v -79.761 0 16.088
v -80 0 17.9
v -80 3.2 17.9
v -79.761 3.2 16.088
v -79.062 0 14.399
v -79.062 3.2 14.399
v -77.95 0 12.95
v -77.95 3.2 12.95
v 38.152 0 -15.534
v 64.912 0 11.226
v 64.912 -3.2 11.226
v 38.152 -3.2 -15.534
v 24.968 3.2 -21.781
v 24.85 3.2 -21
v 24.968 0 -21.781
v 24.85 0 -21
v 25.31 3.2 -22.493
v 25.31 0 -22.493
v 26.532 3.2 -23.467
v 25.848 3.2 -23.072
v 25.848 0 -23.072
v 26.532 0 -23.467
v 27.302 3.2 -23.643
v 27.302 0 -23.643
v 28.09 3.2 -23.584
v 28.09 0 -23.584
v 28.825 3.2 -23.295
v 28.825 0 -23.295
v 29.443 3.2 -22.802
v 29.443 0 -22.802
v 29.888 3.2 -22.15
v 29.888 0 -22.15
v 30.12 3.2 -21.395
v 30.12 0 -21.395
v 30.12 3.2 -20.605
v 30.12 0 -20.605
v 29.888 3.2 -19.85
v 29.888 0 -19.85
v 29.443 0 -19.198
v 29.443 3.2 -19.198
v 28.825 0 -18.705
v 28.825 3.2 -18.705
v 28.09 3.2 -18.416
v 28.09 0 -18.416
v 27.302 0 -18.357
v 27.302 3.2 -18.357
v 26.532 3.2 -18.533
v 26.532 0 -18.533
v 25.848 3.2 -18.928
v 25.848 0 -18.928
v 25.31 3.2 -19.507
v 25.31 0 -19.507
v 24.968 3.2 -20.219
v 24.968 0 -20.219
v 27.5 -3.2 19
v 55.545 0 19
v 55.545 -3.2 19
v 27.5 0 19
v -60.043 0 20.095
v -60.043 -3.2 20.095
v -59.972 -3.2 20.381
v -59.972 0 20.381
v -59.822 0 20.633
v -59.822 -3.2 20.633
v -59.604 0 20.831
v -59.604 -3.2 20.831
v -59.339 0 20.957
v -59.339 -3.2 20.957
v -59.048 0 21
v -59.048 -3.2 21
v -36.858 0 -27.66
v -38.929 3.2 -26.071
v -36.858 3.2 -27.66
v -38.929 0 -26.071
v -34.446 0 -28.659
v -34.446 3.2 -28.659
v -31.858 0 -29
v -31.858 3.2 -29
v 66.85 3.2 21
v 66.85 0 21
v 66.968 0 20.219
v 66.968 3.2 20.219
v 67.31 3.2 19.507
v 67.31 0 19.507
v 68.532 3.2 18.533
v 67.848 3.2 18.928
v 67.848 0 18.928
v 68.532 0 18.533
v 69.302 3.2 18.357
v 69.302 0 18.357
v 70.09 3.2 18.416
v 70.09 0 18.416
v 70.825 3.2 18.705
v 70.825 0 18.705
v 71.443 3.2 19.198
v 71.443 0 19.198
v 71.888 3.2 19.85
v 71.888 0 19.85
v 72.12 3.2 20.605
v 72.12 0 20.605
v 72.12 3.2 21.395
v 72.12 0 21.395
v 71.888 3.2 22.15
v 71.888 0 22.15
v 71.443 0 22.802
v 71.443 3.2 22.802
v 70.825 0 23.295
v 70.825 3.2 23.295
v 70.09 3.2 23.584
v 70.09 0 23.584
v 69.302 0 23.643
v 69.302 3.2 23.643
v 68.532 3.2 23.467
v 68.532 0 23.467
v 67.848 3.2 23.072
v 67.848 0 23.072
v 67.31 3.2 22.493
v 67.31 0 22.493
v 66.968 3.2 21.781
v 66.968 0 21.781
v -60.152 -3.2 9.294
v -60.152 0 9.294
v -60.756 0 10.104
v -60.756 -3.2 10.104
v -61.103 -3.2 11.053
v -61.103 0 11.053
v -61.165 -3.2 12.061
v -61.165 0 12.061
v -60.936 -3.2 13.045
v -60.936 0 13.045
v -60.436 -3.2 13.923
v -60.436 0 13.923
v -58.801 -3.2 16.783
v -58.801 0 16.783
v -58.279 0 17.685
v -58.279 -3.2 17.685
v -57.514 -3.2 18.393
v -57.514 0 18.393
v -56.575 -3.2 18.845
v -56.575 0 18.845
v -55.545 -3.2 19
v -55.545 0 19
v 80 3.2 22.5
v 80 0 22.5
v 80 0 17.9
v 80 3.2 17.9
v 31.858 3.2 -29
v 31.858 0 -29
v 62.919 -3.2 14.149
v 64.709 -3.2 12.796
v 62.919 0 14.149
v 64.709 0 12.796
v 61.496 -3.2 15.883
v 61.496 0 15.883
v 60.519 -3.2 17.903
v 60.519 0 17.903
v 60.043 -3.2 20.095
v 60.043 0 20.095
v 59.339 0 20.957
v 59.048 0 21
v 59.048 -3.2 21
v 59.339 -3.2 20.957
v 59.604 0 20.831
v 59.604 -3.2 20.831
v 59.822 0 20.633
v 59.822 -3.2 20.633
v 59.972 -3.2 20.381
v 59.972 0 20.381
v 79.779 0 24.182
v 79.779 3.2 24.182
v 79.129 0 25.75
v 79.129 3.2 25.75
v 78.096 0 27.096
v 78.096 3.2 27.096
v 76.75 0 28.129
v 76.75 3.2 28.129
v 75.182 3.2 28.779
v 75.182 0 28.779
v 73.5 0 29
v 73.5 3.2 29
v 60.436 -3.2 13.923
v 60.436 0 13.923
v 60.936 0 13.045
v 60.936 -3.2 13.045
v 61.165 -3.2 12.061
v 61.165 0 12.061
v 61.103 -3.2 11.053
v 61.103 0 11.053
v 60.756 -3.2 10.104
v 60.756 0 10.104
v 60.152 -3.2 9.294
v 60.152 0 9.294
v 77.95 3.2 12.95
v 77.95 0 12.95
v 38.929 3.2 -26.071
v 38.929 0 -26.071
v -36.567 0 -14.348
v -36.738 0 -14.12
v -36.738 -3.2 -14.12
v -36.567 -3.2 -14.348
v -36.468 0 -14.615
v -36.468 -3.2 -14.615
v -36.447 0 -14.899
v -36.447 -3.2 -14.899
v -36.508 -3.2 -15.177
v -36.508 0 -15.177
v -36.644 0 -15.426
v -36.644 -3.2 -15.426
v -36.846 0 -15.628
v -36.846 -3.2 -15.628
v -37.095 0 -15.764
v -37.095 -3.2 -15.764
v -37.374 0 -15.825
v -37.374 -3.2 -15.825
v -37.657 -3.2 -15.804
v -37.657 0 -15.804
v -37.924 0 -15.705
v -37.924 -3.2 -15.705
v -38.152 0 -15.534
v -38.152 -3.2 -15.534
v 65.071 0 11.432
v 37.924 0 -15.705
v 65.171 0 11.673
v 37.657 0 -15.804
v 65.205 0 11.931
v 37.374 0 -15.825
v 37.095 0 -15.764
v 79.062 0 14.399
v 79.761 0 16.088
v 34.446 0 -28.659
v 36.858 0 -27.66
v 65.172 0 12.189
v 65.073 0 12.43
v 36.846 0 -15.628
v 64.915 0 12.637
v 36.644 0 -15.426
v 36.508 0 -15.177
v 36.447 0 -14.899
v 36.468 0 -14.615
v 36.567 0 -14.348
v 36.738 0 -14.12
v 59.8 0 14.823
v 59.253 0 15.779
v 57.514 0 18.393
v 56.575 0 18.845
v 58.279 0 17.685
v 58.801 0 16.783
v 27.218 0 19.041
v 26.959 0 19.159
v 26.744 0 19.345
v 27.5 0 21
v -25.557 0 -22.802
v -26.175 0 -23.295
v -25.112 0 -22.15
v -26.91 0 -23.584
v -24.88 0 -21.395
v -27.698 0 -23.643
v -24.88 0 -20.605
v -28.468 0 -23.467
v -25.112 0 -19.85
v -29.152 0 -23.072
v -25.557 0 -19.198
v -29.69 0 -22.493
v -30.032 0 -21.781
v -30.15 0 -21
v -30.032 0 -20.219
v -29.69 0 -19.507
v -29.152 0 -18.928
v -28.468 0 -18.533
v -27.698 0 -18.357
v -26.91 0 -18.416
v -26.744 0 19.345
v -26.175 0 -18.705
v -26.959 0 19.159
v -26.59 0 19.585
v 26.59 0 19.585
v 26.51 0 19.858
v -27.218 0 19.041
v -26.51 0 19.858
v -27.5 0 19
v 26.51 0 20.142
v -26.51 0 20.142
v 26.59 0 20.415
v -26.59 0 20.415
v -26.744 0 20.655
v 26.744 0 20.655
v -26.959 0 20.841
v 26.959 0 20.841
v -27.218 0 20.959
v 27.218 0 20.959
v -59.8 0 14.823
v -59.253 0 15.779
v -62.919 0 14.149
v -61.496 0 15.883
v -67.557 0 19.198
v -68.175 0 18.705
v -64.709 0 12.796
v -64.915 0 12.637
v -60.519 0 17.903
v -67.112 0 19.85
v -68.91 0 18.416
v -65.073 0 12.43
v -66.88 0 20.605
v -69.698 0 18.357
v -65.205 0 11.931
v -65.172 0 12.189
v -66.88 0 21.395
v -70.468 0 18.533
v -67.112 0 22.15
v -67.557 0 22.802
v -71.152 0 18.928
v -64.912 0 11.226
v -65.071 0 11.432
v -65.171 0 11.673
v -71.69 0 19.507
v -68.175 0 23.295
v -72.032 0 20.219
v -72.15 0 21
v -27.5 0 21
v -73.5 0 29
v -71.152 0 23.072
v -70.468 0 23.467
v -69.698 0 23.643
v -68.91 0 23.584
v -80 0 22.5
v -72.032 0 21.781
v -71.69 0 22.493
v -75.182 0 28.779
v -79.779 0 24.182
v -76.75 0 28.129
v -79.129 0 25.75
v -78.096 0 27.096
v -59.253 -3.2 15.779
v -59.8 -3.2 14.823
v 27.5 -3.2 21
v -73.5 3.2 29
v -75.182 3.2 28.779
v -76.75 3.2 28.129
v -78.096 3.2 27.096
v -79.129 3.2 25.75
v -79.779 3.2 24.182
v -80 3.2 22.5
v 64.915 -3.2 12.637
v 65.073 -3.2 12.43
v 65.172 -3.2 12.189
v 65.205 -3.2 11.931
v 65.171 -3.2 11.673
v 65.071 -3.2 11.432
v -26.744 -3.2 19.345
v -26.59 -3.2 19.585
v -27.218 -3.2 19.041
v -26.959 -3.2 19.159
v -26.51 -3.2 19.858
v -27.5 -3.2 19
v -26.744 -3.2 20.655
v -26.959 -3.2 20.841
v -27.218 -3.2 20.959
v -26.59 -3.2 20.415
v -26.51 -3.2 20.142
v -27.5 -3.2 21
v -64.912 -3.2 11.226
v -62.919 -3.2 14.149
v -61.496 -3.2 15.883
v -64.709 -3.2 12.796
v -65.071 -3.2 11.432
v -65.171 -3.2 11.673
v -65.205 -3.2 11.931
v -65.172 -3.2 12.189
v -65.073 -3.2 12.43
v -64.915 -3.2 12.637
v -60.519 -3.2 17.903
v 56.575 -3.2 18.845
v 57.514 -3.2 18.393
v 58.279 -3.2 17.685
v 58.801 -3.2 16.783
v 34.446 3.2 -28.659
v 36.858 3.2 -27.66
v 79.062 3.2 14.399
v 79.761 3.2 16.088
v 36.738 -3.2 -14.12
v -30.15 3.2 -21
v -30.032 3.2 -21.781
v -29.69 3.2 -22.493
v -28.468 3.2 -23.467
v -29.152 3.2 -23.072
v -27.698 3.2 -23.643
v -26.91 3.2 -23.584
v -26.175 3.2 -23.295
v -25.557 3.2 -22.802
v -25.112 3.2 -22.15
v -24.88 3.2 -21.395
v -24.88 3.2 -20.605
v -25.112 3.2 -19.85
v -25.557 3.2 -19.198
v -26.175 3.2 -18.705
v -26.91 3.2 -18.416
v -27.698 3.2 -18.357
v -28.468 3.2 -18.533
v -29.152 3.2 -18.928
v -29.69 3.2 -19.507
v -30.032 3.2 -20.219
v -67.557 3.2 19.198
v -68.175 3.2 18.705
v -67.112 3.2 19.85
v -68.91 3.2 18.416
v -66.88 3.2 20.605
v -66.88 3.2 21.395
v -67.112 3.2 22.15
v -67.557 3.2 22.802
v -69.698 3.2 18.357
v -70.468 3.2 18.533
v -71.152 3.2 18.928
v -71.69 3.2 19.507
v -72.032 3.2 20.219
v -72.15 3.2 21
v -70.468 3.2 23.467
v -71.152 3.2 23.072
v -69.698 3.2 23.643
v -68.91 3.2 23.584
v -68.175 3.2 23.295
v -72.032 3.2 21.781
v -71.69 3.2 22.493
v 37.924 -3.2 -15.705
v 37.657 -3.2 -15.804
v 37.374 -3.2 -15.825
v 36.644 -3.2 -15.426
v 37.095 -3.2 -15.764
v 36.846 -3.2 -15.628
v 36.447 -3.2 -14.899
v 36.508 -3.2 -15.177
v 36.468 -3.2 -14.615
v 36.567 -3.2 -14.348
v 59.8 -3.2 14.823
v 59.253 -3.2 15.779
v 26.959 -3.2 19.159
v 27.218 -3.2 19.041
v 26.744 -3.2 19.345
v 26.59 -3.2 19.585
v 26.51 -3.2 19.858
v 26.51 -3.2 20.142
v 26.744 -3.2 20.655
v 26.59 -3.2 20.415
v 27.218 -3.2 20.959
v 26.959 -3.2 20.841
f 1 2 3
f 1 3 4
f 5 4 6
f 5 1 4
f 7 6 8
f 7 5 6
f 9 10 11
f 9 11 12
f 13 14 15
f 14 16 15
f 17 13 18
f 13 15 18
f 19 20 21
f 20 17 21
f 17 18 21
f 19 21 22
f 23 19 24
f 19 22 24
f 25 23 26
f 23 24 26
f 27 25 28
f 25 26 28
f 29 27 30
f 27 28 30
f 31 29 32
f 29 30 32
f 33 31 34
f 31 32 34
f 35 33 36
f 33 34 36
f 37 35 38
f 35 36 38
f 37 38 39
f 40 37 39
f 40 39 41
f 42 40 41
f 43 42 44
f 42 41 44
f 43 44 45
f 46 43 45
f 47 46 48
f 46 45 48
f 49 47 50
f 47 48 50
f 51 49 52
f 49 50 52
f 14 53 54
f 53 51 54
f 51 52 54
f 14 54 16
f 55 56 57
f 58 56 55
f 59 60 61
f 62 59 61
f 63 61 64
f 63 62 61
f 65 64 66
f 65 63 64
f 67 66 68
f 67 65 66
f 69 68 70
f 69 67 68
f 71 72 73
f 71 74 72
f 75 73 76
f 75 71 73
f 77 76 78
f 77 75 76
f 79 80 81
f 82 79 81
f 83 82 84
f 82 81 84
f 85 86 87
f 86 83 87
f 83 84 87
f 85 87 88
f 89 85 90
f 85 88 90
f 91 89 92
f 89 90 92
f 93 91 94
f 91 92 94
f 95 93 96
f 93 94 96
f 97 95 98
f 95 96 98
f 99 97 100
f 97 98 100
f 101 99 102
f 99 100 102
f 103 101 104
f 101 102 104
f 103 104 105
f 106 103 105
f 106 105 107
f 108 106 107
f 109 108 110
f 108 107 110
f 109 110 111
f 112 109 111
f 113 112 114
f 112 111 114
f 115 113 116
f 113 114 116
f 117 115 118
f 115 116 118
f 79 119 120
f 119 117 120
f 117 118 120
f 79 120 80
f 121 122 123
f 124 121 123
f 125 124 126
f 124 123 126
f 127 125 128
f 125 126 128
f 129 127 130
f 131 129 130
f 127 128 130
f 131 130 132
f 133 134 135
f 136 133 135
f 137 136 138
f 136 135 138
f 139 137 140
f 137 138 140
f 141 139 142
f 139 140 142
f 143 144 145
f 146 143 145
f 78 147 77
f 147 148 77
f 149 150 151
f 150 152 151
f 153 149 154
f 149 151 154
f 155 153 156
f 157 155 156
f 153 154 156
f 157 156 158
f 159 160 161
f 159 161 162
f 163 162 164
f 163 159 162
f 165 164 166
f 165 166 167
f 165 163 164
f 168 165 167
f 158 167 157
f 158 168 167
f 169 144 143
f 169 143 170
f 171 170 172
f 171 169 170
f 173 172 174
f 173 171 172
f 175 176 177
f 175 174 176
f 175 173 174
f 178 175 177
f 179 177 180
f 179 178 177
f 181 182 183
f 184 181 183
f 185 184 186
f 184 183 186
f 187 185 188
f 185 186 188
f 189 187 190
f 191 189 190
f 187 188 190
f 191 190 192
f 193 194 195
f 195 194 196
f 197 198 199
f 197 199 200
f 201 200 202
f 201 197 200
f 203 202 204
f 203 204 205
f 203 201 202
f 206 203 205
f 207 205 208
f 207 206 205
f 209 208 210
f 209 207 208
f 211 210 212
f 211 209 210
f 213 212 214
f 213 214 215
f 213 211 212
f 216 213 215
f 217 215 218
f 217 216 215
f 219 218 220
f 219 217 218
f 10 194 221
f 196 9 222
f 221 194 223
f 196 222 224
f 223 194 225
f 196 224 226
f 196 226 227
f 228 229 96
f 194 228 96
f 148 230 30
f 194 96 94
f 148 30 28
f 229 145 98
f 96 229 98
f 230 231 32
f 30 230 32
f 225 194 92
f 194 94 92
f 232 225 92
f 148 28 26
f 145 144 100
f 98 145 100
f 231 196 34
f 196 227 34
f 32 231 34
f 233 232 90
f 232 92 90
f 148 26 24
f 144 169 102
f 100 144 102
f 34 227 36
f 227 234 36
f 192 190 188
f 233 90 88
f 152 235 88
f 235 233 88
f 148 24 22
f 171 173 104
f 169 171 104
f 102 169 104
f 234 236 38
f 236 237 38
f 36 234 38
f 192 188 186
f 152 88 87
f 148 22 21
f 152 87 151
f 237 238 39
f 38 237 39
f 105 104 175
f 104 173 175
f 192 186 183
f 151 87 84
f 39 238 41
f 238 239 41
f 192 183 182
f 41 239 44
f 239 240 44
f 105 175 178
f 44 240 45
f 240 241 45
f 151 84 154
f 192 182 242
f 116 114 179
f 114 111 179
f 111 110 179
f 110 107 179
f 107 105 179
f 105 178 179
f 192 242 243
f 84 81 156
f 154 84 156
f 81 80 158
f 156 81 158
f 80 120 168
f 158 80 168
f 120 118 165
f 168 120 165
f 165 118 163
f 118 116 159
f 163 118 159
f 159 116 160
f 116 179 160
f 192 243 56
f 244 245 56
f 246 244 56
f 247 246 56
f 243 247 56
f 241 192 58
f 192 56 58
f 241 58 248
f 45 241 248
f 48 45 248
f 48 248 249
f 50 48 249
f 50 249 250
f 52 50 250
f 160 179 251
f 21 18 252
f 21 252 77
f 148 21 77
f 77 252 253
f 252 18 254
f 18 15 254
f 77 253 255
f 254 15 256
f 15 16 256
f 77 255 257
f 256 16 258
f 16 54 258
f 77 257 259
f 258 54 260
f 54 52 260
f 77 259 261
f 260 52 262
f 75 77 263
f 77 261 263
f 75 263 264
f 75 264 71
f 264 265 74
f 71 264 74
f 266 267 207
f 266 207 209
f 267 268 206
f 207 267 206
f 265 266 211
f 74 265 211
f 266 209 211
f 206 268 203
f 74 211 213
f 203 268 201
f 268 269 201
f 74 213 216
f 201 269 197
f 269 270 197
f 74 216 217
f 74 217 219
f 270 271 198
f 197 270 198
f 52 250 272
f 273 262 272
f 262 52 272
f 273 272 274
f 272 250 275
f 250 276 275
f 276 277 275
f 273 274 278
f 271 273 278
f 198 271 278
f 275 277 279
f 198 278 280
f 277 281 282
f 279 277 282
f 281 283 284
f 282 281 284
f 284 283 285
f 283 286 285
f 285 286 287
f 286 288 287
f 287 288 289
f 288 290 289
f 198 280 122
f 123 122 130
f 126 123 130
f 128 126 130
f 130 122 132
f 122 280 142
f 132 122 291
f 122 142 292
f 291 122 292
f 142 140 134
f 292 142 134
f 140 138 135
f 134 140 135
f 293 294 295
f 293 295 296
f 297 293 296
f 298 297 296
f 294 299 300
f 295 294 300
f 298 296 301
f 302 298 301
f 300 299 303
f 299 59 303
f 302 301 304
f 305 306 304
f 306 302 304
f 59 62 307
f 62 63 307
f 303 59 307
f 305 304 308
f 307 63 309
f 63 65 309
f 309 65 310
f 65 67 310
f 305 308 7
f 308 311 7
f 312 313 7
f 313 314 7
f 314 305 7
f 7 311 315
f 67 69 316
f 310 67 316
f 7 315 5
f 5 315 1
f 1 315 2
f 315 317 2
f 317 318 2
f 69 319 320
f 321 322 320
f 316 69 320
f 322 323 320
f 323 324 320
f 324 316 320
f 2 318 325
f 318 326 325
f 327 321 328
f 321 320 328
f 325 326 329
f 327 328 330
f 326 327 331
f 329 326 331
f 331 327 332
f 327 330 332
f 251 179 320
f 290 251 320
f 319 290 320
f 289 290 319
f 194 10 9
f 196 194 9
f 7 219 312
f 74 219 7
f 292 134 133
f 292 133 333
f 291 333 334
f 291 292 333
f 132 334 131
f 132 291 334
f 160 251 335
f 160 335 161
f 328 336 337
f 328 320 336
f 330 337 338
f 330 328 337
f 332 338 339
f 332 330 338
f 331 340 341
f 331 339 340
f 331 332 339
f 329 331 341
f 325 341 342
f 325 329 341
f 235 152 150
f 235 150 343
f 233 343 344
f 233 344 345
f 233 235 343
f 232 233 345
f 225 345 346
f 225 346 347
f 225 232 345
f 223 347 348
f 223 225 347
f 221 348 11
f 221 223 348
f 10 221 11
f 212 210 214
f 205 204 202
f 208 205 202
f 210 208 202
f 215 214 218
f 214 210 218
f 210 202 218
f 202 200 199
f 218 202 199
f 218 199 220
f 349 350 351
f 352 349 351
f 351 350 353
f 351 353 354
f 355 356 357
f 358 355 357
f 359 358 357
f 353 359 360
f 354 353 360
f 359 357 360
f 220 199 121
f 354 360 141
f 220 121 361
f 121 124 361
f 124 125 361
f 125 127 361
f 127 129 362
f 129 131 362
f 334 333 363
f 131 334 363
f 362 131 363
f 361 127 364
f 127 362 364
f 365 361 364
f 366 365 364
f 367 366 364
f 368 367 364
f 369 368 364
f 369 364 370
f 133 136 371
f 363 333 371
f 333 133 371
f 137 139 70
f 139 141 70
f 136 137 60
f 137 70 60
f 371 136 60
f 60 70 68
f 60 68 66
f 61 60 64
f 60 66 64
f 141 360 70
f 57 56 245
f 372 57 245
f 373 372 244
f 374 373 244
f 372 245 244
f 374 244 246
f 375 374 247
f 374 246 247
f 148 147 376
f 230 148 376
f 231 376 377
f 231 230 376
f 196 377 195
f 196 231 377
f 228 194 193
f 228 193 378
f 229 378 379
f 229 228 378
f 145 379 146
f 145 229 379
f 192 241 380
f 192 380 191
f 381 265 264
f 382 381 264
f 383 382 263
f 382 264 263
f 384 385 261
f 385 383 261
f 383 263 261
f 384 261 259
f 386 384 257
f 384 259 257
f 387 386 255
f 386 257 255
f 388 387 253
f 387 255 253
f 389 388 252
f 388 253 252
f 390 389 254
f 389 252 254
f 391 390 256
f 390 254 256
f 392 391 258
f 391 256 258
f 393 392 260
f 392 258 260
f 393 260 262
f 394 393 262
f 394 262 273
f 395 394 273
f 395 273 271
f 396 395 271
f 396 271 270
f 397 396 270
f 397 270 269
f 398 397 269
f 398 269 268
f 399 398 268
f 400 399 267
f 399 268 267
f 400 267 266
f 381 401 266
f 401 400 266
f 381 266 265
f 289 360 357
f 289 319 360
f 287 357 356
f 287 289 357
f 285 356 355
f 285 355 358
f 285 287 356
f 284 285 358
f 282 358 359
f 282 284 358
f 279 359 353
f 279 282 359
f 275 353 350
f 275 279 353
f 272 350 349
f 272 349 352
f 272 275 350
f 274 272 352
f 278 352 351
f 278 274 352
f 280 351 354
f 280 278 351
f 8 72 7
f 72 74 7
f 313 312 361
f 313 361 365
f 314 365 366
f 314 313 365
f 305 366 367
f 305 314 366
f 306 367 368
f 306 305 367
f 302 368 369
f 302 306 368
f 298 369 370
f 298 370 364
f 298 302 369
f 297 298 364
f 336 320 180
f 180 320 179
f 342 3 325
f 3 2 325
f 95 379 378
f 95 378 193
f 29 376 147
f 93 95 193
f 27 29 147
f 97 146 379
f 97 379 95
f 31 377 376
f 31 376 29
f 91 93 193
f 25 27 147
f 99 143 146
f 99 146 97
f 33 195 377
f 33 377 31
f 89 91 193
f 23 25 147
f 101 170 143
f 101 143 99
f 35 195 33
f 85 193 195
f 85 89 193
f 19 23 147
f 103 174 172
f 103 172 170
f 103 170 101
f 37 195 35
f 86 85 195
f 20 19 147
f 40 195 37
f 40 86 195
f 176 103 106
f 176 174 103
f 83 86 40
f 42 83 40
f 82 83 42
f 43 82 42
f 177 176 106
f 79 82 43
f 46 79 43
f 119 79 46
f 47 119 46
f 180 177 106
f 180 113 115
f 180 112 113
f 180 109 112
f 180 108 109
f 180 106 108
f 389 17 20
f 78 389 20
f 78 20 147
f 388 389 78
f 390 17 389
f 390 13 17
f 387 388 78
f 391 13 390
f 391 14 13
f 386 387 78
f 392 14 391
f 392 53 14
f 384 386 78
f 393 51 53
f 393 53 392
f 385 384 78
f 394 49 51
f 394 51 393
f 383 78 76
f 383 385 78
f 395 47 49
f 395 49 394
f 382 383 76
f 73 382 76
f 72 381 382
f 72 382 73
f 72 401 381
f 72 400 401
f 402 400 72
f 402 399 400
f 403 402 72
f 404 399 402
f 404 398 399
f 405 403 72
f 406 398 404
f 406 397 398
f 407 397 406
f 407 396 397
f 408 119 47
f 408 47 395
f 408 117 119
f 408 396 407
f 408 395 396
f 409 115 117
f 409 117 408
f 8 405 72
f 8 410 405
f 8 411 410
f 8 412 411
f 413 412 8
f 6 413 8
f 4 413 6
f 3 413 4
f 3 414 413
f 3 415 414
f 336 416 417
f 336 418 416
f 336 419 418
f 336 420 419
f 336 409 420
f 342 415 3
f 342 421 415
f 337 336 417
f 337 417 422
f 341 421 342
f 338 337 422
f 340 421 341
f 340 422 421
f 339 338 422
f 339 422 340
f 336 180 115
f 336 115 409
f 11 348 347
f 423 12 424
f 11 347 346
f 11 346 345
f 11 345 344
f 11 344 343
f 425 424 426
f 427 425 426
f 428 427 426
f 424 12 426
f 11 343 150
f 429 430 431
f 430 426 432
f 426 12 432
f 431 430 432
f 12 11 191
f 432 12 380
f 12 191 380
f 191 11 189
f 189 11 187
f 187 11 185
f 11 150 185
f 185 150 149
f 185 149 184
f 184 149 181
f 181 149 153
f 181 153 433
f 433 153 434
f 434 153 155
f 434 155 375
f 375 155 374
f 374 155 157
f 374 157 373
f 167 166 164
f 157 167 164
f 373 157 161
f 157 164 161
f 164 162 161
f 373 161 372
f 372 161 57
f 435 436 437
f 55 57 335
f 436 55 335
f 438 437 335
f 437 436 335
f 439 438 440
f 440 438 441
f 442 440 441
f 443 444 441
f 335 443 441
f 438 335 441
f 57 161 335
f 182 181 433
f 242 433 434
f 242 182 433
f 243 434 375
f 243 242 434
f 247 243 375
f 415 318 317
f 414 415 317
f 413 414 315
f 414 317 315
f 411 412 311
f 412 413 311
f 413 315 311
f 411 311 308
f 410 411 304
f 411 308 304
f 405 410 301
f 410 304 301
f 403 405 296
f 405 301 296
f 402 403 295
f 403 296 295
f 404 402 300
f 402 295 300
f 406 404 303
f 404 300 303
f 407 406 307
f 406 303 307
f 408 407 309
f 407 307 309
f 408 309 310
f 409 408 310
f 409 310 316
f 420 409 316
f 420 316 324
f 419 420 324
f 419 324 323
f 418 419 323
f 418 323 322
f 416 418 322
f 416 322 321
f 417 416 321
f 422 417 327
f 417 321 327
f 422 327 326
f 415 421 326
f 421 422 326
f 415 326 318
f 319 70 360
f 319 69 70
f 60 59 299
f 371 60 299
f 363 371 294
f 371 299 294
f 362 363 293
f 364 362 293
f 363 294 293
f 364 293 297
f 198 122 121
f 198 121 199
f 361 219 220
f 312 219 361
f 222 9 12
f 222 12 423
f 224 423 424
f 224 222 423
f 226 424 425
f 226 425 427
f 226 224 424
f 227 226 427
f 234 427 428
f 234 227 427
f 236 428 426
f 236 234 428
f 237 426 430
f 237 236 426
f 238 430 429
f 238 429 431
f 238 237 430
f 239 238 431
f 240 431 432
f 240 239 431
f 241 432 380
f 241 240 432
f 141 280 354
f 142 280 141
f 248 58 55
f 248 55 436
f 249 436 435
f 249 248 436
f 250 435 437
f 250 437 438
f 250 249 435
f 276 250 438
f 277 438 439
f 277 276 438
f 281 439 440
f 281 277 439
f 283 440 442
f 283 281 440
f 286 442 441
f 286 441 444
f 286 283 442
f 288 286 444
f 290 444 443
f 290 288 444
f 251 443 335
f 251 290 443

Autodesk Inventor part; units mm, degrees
sketch "Sketch_1" plane through (0, 0, 0) normal (0, 1, 0) x (-1, 0, 0)
  arc A0 (80, 22.5) -> (73.5, 29) centre (73.5, 22.5) ccw
  line L0 (73.5, 29) -> (-73.5, 29)
  arc A1 (-73.5, 29) -> (-80, 22.5) centre (-73.5, 22.5) ccw
  line L1 (-80, 22.5) -> (-80, 17.8995)
  arc A2 (-80, 17.8995) -> (-77.9497, 12.9497) centre (-73, 17.8995) ccw
  line L2 (-77.9497, 12.9497) -> (-38.9289, -26.0711)
  arc A3 (-38.9289, -26.0711) -> (-31.8579, -29) centre (-31.8579, -19) ccw
  line L3 (-31.8579, -29) -> (31.8579, -29)
  arc A4 (31.8579, -29) -> (38.9289, -26.0711) centre (31.8579, -19) ccw
  line L4 (38.9289, -26.0711) -> (77.9497, 12.9497)
  arc A5 (77.9497, 12.9497) -> (80, 17.8995) centre (73, 17.8995) ccw
  line L5 (80, 17.8995) -> (80, 22.5)
  circle A6 centre (-69.5, 21) radius 2.65
  circle A7 centre (-27.5, -21) radius 2.65
  circle A8 centre (27.5, -21) radius 2.65
  circle A9 centre (69.5, 21) radius 2.65
extrude "Extrusion1" add sketch "Sketch_1" along normal blind 3.2
sketch "Sketch_2" plane through (0, 0, 0) normal (0, 1, 0) x (-1, 0, 0)
  arc A0 (64.9121, 11.2258) -> (64.7093, 12.7964) centre (64.205, 11.9329) ccw
  arc A1 (60.0432, 20.0952) -> (64.7093, 12.7964) centre (69.5, 21) ccw
  arc A2 (60.0432, 20.0952) -> (59.0477, 21) centre (59.0477, 20) ccw
  line L0 (59.0477, 21) -> (27.5, 21)
  arc A3 (27.5, 21) -> (27.5, 19) centre (27.5, 20) ccw
  line L1 (27.5, 19) -> (55.5447, 19)
  arc A4 (58.8009, 16.7833) -> (55.5447, 19) centre (55.5447, 15.5) ccw
  arc A5 (58.8009, 16.7833) -> (60.4356, 13.9228) centre (69.5, 21) ccw
  arc A6 (60.1518, 9.2939) -> (60.4356, 13.9228) centre (57.6769, 11.7688) ccw
  line L2 (60.1518, 9.2939) -> (36.7378, -14.1201)
  arc A7 (36.7378, -14.1201) -> (38.152, -15.5343) centre (37.4449, -14.8272) ccw
  line L3 (38.152, -15.5343) -> (64.9121, 11.2258)
extrude "Extrusion2" add sketch "Sketch_2" against normal blind 3.2
sketch "Sketch_3" plane through (0, 0, 0) normal (0, 1, 0) x (-1, 0, 0)
  arc A0 (-27.5, 19) -> (-27.5, 21) centre (-27.5, 20) ccw
  line L0 (-27.5, 21) -> (-59.0477, 21)
  arc A1 (-59.0477, 21) -> (-60.0432, 20.0952) centre (-59.0477, 20) ccw
  arc A2 (-64.7093, 12.7964) -> (-60.0432, 20.0952) centre (-69.5, 21) ccw
  arc A3 (-64.7093, 12.7964) -> (-64.9121, 11.2258) centre (-64.205, 11.9329) ccw
  line L1 (-64.9121, 11.2258) -> (-38.152, -15.5343)
  arc A4 (-38.152, -15.5343) -> (-36.7378, -14.1201) centre (-37.4449, -14.8272) ccw
  line L2 (-36.7378, -14.1201) -> (-60.1518, 9.2939)
  arc A5 (-60.4356, 13.9228) -> (-60.1518, 9.2939) centre (-57.6769, 11.7688) ccw
  arc A6 (-60.4356, 13.9228) -> (-58.8009, 16.7833) centre (-69.5, 21) ccw
  arc A7 (-55.5447, 19) -> (-58.8009, 16.7833) centre (-55.5447, 15.5) ccw
  line L3 (-55.5447, 19) -> (-27.5, 19)
extrude "Extrusion3" add sketch "Sketch_3" against normal blind 3.2
ref_plane "swivel_to_body_XY" through (0, -3.2, 0) normal (0, 1, 0) x (1, 0, 0)
ref_plane "swivel_to_body_YZ" through (0, -3.2, 0) normal (1, 0, 0) x (0, 0, -1)
ref_plane "swivel_to_body_ZX" through (0, -3.2, 0) normal (0, 0, -1) x (0, 1, 0)
ref_plane "swivel_to_dummy_XY" through (0, 3.2, 0) normal (0, -1, 0) x (1, 0, 0)
ref_plane "swivel_to_dummy_YZ" through (0, 3.2, 0) normal (1, 0, 0) x (0, 0, 1)
ref_plane "swivel_to_dummy_ZX" through (0, 3.2, 0) normal (0, 0, 1) x (0, -1, 0)
properties part number "SWIVEL-HSMCS50"
